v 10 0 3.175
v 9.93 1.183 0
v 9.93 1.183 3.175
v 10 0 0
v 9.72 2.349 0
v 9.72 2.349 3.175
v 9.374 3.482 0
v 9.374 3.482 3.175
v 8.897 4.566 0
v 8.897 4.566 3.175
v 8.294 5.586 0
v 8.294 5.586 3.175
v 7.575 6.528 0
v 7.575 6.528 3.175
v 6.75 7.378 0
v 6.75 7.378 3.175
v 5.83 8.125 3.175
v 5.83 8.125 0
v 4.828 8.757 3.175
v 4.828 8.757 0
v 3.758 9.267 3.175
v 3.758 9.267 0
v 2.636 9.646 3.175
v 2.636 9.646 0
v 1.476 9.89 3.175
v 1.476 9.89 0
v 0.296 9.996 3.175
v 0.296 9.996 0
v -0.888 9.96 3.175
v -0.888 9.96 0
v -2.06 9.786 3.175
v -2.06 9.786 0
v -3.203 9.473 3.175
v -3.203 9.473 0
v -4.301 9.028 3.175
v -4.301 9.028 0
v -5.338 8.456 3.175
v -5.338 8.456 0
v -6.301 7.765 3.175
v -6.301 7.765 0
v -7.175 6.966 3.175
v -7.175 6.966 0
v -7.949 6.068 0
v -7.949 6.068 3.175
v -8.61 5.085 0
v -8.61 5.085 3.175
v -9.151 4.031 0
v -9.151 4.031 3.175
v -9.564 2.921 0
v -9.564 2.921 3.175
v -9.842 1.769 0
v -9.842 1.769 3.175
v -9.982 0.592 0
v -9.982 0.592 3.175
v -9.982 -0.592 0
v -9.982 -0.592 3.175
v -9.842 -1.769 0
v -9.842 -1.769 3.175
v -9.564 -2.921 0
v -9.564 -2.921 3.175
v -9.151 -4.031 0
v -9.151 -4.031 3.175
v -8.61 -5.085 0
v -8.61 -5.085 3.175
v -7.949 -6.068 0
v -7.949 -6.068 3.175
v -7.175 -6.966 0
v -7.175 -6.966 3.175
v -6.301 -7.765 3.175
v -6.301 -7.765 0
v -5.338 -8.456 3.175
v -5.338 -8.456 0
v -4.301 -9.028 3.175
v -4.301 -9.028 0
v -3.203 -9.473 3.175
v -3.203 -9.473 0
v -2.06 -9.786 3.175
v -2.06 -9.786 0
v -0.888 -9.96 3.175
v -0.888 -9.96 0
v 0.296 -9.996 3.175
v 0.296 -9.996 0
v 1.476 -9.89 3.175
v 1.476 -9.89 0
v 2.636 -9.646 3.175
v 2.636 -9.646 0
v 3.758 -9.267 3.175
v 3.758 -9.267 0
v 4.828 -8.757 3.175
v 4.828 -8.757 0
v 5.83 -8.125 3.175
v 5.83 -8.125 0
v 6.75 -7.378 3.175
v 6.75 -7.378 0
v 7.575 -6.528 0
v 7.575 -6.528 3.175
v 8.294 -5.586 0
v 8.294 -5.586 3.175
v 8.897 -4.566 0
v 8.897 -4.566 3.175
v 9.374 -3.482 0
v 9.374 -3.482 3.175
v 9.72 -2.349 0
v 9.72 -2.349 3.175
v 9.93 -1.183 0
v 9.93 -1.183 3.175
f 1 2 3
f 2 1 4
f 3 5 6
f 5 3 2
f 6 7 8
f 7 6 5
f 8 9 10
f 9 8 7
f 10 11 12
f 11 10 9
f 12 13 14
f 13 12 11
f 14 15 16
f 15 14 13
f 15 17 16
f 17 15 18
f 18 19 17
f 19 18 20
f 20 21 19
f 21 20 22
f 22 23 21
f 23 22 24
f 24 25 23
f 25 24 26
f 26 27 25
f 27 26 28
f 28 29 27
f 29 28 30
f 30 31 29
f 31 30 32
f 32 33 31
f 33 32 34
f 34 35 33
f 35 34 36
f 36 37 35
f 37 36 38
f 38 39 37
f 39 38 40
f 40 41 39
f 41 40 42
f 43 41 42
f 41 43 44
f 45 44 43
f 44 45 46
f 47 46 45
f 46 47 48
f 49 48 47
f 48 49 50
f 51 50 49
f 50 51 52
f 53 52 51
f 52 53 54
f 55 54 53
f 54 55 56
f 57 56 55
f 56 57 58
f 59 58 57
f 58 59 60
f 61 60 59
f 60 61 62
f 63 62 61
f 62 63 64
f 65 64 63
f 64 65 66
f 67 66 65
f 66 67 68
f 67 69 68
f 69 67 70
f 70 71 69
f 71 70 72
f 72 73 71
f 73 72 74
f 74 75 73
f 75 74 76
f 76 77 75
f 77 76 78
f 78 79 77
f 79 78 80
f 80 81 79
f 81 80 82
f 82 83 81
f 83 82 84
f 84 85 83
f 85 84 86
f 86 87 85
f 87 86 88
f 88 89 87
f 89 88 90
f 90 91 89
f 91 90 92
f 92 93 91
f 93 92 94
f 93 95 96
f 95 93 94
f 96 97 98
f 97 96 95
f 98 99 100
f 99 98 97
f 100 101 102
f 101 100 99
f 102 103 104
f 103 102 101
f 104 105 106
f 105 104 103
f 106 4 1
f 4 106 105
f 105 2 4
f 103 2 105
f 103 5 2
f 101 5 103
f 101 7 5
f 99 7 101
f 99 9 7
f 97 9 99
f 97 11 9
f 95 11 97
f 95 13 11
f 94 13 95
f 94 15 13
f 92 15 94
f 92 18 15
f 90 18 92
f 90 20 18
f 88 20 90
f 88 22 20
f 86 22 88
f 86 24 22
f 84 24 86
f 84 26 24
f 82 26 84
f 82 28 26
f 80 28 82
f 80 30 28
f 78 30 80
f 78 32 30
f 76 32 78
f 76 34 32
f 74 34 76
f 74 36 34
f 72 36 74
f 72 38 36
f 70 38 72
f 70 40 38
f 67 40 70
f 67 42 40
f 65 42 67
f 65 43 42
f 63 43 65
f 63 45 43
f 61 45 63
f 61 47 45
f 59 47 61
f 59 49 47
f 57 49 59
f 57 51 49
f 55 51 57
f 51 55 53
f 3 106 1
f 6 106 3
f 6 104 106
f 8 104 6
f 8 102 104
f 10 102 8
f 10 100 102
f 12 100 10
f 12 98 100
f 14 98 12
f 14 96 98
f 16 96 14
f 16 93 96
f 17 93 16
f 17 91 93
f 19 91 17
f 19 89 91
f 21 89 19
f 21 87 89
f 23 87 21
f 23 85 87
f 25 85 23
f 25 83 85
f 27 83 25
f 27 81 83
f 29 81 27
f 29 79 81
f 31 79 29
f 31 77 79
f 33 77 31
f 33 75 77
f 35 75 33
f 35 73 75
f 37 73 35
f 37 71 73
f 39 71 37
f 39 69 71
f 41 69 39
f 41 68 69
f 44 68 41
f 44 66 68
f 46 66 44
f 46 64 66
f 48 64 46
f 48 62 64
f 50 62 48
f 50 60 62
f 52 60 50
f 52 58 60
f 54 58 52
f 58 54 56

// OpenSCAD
// Cyl-v1.0
// A cylinder

thickness = 3.175;
diameter  = 20;
$fn = max(24, min(360, sqrt(diameter) * ($preview ? 6 : 12)));

cylinder(d=diameter, h=thickness);
